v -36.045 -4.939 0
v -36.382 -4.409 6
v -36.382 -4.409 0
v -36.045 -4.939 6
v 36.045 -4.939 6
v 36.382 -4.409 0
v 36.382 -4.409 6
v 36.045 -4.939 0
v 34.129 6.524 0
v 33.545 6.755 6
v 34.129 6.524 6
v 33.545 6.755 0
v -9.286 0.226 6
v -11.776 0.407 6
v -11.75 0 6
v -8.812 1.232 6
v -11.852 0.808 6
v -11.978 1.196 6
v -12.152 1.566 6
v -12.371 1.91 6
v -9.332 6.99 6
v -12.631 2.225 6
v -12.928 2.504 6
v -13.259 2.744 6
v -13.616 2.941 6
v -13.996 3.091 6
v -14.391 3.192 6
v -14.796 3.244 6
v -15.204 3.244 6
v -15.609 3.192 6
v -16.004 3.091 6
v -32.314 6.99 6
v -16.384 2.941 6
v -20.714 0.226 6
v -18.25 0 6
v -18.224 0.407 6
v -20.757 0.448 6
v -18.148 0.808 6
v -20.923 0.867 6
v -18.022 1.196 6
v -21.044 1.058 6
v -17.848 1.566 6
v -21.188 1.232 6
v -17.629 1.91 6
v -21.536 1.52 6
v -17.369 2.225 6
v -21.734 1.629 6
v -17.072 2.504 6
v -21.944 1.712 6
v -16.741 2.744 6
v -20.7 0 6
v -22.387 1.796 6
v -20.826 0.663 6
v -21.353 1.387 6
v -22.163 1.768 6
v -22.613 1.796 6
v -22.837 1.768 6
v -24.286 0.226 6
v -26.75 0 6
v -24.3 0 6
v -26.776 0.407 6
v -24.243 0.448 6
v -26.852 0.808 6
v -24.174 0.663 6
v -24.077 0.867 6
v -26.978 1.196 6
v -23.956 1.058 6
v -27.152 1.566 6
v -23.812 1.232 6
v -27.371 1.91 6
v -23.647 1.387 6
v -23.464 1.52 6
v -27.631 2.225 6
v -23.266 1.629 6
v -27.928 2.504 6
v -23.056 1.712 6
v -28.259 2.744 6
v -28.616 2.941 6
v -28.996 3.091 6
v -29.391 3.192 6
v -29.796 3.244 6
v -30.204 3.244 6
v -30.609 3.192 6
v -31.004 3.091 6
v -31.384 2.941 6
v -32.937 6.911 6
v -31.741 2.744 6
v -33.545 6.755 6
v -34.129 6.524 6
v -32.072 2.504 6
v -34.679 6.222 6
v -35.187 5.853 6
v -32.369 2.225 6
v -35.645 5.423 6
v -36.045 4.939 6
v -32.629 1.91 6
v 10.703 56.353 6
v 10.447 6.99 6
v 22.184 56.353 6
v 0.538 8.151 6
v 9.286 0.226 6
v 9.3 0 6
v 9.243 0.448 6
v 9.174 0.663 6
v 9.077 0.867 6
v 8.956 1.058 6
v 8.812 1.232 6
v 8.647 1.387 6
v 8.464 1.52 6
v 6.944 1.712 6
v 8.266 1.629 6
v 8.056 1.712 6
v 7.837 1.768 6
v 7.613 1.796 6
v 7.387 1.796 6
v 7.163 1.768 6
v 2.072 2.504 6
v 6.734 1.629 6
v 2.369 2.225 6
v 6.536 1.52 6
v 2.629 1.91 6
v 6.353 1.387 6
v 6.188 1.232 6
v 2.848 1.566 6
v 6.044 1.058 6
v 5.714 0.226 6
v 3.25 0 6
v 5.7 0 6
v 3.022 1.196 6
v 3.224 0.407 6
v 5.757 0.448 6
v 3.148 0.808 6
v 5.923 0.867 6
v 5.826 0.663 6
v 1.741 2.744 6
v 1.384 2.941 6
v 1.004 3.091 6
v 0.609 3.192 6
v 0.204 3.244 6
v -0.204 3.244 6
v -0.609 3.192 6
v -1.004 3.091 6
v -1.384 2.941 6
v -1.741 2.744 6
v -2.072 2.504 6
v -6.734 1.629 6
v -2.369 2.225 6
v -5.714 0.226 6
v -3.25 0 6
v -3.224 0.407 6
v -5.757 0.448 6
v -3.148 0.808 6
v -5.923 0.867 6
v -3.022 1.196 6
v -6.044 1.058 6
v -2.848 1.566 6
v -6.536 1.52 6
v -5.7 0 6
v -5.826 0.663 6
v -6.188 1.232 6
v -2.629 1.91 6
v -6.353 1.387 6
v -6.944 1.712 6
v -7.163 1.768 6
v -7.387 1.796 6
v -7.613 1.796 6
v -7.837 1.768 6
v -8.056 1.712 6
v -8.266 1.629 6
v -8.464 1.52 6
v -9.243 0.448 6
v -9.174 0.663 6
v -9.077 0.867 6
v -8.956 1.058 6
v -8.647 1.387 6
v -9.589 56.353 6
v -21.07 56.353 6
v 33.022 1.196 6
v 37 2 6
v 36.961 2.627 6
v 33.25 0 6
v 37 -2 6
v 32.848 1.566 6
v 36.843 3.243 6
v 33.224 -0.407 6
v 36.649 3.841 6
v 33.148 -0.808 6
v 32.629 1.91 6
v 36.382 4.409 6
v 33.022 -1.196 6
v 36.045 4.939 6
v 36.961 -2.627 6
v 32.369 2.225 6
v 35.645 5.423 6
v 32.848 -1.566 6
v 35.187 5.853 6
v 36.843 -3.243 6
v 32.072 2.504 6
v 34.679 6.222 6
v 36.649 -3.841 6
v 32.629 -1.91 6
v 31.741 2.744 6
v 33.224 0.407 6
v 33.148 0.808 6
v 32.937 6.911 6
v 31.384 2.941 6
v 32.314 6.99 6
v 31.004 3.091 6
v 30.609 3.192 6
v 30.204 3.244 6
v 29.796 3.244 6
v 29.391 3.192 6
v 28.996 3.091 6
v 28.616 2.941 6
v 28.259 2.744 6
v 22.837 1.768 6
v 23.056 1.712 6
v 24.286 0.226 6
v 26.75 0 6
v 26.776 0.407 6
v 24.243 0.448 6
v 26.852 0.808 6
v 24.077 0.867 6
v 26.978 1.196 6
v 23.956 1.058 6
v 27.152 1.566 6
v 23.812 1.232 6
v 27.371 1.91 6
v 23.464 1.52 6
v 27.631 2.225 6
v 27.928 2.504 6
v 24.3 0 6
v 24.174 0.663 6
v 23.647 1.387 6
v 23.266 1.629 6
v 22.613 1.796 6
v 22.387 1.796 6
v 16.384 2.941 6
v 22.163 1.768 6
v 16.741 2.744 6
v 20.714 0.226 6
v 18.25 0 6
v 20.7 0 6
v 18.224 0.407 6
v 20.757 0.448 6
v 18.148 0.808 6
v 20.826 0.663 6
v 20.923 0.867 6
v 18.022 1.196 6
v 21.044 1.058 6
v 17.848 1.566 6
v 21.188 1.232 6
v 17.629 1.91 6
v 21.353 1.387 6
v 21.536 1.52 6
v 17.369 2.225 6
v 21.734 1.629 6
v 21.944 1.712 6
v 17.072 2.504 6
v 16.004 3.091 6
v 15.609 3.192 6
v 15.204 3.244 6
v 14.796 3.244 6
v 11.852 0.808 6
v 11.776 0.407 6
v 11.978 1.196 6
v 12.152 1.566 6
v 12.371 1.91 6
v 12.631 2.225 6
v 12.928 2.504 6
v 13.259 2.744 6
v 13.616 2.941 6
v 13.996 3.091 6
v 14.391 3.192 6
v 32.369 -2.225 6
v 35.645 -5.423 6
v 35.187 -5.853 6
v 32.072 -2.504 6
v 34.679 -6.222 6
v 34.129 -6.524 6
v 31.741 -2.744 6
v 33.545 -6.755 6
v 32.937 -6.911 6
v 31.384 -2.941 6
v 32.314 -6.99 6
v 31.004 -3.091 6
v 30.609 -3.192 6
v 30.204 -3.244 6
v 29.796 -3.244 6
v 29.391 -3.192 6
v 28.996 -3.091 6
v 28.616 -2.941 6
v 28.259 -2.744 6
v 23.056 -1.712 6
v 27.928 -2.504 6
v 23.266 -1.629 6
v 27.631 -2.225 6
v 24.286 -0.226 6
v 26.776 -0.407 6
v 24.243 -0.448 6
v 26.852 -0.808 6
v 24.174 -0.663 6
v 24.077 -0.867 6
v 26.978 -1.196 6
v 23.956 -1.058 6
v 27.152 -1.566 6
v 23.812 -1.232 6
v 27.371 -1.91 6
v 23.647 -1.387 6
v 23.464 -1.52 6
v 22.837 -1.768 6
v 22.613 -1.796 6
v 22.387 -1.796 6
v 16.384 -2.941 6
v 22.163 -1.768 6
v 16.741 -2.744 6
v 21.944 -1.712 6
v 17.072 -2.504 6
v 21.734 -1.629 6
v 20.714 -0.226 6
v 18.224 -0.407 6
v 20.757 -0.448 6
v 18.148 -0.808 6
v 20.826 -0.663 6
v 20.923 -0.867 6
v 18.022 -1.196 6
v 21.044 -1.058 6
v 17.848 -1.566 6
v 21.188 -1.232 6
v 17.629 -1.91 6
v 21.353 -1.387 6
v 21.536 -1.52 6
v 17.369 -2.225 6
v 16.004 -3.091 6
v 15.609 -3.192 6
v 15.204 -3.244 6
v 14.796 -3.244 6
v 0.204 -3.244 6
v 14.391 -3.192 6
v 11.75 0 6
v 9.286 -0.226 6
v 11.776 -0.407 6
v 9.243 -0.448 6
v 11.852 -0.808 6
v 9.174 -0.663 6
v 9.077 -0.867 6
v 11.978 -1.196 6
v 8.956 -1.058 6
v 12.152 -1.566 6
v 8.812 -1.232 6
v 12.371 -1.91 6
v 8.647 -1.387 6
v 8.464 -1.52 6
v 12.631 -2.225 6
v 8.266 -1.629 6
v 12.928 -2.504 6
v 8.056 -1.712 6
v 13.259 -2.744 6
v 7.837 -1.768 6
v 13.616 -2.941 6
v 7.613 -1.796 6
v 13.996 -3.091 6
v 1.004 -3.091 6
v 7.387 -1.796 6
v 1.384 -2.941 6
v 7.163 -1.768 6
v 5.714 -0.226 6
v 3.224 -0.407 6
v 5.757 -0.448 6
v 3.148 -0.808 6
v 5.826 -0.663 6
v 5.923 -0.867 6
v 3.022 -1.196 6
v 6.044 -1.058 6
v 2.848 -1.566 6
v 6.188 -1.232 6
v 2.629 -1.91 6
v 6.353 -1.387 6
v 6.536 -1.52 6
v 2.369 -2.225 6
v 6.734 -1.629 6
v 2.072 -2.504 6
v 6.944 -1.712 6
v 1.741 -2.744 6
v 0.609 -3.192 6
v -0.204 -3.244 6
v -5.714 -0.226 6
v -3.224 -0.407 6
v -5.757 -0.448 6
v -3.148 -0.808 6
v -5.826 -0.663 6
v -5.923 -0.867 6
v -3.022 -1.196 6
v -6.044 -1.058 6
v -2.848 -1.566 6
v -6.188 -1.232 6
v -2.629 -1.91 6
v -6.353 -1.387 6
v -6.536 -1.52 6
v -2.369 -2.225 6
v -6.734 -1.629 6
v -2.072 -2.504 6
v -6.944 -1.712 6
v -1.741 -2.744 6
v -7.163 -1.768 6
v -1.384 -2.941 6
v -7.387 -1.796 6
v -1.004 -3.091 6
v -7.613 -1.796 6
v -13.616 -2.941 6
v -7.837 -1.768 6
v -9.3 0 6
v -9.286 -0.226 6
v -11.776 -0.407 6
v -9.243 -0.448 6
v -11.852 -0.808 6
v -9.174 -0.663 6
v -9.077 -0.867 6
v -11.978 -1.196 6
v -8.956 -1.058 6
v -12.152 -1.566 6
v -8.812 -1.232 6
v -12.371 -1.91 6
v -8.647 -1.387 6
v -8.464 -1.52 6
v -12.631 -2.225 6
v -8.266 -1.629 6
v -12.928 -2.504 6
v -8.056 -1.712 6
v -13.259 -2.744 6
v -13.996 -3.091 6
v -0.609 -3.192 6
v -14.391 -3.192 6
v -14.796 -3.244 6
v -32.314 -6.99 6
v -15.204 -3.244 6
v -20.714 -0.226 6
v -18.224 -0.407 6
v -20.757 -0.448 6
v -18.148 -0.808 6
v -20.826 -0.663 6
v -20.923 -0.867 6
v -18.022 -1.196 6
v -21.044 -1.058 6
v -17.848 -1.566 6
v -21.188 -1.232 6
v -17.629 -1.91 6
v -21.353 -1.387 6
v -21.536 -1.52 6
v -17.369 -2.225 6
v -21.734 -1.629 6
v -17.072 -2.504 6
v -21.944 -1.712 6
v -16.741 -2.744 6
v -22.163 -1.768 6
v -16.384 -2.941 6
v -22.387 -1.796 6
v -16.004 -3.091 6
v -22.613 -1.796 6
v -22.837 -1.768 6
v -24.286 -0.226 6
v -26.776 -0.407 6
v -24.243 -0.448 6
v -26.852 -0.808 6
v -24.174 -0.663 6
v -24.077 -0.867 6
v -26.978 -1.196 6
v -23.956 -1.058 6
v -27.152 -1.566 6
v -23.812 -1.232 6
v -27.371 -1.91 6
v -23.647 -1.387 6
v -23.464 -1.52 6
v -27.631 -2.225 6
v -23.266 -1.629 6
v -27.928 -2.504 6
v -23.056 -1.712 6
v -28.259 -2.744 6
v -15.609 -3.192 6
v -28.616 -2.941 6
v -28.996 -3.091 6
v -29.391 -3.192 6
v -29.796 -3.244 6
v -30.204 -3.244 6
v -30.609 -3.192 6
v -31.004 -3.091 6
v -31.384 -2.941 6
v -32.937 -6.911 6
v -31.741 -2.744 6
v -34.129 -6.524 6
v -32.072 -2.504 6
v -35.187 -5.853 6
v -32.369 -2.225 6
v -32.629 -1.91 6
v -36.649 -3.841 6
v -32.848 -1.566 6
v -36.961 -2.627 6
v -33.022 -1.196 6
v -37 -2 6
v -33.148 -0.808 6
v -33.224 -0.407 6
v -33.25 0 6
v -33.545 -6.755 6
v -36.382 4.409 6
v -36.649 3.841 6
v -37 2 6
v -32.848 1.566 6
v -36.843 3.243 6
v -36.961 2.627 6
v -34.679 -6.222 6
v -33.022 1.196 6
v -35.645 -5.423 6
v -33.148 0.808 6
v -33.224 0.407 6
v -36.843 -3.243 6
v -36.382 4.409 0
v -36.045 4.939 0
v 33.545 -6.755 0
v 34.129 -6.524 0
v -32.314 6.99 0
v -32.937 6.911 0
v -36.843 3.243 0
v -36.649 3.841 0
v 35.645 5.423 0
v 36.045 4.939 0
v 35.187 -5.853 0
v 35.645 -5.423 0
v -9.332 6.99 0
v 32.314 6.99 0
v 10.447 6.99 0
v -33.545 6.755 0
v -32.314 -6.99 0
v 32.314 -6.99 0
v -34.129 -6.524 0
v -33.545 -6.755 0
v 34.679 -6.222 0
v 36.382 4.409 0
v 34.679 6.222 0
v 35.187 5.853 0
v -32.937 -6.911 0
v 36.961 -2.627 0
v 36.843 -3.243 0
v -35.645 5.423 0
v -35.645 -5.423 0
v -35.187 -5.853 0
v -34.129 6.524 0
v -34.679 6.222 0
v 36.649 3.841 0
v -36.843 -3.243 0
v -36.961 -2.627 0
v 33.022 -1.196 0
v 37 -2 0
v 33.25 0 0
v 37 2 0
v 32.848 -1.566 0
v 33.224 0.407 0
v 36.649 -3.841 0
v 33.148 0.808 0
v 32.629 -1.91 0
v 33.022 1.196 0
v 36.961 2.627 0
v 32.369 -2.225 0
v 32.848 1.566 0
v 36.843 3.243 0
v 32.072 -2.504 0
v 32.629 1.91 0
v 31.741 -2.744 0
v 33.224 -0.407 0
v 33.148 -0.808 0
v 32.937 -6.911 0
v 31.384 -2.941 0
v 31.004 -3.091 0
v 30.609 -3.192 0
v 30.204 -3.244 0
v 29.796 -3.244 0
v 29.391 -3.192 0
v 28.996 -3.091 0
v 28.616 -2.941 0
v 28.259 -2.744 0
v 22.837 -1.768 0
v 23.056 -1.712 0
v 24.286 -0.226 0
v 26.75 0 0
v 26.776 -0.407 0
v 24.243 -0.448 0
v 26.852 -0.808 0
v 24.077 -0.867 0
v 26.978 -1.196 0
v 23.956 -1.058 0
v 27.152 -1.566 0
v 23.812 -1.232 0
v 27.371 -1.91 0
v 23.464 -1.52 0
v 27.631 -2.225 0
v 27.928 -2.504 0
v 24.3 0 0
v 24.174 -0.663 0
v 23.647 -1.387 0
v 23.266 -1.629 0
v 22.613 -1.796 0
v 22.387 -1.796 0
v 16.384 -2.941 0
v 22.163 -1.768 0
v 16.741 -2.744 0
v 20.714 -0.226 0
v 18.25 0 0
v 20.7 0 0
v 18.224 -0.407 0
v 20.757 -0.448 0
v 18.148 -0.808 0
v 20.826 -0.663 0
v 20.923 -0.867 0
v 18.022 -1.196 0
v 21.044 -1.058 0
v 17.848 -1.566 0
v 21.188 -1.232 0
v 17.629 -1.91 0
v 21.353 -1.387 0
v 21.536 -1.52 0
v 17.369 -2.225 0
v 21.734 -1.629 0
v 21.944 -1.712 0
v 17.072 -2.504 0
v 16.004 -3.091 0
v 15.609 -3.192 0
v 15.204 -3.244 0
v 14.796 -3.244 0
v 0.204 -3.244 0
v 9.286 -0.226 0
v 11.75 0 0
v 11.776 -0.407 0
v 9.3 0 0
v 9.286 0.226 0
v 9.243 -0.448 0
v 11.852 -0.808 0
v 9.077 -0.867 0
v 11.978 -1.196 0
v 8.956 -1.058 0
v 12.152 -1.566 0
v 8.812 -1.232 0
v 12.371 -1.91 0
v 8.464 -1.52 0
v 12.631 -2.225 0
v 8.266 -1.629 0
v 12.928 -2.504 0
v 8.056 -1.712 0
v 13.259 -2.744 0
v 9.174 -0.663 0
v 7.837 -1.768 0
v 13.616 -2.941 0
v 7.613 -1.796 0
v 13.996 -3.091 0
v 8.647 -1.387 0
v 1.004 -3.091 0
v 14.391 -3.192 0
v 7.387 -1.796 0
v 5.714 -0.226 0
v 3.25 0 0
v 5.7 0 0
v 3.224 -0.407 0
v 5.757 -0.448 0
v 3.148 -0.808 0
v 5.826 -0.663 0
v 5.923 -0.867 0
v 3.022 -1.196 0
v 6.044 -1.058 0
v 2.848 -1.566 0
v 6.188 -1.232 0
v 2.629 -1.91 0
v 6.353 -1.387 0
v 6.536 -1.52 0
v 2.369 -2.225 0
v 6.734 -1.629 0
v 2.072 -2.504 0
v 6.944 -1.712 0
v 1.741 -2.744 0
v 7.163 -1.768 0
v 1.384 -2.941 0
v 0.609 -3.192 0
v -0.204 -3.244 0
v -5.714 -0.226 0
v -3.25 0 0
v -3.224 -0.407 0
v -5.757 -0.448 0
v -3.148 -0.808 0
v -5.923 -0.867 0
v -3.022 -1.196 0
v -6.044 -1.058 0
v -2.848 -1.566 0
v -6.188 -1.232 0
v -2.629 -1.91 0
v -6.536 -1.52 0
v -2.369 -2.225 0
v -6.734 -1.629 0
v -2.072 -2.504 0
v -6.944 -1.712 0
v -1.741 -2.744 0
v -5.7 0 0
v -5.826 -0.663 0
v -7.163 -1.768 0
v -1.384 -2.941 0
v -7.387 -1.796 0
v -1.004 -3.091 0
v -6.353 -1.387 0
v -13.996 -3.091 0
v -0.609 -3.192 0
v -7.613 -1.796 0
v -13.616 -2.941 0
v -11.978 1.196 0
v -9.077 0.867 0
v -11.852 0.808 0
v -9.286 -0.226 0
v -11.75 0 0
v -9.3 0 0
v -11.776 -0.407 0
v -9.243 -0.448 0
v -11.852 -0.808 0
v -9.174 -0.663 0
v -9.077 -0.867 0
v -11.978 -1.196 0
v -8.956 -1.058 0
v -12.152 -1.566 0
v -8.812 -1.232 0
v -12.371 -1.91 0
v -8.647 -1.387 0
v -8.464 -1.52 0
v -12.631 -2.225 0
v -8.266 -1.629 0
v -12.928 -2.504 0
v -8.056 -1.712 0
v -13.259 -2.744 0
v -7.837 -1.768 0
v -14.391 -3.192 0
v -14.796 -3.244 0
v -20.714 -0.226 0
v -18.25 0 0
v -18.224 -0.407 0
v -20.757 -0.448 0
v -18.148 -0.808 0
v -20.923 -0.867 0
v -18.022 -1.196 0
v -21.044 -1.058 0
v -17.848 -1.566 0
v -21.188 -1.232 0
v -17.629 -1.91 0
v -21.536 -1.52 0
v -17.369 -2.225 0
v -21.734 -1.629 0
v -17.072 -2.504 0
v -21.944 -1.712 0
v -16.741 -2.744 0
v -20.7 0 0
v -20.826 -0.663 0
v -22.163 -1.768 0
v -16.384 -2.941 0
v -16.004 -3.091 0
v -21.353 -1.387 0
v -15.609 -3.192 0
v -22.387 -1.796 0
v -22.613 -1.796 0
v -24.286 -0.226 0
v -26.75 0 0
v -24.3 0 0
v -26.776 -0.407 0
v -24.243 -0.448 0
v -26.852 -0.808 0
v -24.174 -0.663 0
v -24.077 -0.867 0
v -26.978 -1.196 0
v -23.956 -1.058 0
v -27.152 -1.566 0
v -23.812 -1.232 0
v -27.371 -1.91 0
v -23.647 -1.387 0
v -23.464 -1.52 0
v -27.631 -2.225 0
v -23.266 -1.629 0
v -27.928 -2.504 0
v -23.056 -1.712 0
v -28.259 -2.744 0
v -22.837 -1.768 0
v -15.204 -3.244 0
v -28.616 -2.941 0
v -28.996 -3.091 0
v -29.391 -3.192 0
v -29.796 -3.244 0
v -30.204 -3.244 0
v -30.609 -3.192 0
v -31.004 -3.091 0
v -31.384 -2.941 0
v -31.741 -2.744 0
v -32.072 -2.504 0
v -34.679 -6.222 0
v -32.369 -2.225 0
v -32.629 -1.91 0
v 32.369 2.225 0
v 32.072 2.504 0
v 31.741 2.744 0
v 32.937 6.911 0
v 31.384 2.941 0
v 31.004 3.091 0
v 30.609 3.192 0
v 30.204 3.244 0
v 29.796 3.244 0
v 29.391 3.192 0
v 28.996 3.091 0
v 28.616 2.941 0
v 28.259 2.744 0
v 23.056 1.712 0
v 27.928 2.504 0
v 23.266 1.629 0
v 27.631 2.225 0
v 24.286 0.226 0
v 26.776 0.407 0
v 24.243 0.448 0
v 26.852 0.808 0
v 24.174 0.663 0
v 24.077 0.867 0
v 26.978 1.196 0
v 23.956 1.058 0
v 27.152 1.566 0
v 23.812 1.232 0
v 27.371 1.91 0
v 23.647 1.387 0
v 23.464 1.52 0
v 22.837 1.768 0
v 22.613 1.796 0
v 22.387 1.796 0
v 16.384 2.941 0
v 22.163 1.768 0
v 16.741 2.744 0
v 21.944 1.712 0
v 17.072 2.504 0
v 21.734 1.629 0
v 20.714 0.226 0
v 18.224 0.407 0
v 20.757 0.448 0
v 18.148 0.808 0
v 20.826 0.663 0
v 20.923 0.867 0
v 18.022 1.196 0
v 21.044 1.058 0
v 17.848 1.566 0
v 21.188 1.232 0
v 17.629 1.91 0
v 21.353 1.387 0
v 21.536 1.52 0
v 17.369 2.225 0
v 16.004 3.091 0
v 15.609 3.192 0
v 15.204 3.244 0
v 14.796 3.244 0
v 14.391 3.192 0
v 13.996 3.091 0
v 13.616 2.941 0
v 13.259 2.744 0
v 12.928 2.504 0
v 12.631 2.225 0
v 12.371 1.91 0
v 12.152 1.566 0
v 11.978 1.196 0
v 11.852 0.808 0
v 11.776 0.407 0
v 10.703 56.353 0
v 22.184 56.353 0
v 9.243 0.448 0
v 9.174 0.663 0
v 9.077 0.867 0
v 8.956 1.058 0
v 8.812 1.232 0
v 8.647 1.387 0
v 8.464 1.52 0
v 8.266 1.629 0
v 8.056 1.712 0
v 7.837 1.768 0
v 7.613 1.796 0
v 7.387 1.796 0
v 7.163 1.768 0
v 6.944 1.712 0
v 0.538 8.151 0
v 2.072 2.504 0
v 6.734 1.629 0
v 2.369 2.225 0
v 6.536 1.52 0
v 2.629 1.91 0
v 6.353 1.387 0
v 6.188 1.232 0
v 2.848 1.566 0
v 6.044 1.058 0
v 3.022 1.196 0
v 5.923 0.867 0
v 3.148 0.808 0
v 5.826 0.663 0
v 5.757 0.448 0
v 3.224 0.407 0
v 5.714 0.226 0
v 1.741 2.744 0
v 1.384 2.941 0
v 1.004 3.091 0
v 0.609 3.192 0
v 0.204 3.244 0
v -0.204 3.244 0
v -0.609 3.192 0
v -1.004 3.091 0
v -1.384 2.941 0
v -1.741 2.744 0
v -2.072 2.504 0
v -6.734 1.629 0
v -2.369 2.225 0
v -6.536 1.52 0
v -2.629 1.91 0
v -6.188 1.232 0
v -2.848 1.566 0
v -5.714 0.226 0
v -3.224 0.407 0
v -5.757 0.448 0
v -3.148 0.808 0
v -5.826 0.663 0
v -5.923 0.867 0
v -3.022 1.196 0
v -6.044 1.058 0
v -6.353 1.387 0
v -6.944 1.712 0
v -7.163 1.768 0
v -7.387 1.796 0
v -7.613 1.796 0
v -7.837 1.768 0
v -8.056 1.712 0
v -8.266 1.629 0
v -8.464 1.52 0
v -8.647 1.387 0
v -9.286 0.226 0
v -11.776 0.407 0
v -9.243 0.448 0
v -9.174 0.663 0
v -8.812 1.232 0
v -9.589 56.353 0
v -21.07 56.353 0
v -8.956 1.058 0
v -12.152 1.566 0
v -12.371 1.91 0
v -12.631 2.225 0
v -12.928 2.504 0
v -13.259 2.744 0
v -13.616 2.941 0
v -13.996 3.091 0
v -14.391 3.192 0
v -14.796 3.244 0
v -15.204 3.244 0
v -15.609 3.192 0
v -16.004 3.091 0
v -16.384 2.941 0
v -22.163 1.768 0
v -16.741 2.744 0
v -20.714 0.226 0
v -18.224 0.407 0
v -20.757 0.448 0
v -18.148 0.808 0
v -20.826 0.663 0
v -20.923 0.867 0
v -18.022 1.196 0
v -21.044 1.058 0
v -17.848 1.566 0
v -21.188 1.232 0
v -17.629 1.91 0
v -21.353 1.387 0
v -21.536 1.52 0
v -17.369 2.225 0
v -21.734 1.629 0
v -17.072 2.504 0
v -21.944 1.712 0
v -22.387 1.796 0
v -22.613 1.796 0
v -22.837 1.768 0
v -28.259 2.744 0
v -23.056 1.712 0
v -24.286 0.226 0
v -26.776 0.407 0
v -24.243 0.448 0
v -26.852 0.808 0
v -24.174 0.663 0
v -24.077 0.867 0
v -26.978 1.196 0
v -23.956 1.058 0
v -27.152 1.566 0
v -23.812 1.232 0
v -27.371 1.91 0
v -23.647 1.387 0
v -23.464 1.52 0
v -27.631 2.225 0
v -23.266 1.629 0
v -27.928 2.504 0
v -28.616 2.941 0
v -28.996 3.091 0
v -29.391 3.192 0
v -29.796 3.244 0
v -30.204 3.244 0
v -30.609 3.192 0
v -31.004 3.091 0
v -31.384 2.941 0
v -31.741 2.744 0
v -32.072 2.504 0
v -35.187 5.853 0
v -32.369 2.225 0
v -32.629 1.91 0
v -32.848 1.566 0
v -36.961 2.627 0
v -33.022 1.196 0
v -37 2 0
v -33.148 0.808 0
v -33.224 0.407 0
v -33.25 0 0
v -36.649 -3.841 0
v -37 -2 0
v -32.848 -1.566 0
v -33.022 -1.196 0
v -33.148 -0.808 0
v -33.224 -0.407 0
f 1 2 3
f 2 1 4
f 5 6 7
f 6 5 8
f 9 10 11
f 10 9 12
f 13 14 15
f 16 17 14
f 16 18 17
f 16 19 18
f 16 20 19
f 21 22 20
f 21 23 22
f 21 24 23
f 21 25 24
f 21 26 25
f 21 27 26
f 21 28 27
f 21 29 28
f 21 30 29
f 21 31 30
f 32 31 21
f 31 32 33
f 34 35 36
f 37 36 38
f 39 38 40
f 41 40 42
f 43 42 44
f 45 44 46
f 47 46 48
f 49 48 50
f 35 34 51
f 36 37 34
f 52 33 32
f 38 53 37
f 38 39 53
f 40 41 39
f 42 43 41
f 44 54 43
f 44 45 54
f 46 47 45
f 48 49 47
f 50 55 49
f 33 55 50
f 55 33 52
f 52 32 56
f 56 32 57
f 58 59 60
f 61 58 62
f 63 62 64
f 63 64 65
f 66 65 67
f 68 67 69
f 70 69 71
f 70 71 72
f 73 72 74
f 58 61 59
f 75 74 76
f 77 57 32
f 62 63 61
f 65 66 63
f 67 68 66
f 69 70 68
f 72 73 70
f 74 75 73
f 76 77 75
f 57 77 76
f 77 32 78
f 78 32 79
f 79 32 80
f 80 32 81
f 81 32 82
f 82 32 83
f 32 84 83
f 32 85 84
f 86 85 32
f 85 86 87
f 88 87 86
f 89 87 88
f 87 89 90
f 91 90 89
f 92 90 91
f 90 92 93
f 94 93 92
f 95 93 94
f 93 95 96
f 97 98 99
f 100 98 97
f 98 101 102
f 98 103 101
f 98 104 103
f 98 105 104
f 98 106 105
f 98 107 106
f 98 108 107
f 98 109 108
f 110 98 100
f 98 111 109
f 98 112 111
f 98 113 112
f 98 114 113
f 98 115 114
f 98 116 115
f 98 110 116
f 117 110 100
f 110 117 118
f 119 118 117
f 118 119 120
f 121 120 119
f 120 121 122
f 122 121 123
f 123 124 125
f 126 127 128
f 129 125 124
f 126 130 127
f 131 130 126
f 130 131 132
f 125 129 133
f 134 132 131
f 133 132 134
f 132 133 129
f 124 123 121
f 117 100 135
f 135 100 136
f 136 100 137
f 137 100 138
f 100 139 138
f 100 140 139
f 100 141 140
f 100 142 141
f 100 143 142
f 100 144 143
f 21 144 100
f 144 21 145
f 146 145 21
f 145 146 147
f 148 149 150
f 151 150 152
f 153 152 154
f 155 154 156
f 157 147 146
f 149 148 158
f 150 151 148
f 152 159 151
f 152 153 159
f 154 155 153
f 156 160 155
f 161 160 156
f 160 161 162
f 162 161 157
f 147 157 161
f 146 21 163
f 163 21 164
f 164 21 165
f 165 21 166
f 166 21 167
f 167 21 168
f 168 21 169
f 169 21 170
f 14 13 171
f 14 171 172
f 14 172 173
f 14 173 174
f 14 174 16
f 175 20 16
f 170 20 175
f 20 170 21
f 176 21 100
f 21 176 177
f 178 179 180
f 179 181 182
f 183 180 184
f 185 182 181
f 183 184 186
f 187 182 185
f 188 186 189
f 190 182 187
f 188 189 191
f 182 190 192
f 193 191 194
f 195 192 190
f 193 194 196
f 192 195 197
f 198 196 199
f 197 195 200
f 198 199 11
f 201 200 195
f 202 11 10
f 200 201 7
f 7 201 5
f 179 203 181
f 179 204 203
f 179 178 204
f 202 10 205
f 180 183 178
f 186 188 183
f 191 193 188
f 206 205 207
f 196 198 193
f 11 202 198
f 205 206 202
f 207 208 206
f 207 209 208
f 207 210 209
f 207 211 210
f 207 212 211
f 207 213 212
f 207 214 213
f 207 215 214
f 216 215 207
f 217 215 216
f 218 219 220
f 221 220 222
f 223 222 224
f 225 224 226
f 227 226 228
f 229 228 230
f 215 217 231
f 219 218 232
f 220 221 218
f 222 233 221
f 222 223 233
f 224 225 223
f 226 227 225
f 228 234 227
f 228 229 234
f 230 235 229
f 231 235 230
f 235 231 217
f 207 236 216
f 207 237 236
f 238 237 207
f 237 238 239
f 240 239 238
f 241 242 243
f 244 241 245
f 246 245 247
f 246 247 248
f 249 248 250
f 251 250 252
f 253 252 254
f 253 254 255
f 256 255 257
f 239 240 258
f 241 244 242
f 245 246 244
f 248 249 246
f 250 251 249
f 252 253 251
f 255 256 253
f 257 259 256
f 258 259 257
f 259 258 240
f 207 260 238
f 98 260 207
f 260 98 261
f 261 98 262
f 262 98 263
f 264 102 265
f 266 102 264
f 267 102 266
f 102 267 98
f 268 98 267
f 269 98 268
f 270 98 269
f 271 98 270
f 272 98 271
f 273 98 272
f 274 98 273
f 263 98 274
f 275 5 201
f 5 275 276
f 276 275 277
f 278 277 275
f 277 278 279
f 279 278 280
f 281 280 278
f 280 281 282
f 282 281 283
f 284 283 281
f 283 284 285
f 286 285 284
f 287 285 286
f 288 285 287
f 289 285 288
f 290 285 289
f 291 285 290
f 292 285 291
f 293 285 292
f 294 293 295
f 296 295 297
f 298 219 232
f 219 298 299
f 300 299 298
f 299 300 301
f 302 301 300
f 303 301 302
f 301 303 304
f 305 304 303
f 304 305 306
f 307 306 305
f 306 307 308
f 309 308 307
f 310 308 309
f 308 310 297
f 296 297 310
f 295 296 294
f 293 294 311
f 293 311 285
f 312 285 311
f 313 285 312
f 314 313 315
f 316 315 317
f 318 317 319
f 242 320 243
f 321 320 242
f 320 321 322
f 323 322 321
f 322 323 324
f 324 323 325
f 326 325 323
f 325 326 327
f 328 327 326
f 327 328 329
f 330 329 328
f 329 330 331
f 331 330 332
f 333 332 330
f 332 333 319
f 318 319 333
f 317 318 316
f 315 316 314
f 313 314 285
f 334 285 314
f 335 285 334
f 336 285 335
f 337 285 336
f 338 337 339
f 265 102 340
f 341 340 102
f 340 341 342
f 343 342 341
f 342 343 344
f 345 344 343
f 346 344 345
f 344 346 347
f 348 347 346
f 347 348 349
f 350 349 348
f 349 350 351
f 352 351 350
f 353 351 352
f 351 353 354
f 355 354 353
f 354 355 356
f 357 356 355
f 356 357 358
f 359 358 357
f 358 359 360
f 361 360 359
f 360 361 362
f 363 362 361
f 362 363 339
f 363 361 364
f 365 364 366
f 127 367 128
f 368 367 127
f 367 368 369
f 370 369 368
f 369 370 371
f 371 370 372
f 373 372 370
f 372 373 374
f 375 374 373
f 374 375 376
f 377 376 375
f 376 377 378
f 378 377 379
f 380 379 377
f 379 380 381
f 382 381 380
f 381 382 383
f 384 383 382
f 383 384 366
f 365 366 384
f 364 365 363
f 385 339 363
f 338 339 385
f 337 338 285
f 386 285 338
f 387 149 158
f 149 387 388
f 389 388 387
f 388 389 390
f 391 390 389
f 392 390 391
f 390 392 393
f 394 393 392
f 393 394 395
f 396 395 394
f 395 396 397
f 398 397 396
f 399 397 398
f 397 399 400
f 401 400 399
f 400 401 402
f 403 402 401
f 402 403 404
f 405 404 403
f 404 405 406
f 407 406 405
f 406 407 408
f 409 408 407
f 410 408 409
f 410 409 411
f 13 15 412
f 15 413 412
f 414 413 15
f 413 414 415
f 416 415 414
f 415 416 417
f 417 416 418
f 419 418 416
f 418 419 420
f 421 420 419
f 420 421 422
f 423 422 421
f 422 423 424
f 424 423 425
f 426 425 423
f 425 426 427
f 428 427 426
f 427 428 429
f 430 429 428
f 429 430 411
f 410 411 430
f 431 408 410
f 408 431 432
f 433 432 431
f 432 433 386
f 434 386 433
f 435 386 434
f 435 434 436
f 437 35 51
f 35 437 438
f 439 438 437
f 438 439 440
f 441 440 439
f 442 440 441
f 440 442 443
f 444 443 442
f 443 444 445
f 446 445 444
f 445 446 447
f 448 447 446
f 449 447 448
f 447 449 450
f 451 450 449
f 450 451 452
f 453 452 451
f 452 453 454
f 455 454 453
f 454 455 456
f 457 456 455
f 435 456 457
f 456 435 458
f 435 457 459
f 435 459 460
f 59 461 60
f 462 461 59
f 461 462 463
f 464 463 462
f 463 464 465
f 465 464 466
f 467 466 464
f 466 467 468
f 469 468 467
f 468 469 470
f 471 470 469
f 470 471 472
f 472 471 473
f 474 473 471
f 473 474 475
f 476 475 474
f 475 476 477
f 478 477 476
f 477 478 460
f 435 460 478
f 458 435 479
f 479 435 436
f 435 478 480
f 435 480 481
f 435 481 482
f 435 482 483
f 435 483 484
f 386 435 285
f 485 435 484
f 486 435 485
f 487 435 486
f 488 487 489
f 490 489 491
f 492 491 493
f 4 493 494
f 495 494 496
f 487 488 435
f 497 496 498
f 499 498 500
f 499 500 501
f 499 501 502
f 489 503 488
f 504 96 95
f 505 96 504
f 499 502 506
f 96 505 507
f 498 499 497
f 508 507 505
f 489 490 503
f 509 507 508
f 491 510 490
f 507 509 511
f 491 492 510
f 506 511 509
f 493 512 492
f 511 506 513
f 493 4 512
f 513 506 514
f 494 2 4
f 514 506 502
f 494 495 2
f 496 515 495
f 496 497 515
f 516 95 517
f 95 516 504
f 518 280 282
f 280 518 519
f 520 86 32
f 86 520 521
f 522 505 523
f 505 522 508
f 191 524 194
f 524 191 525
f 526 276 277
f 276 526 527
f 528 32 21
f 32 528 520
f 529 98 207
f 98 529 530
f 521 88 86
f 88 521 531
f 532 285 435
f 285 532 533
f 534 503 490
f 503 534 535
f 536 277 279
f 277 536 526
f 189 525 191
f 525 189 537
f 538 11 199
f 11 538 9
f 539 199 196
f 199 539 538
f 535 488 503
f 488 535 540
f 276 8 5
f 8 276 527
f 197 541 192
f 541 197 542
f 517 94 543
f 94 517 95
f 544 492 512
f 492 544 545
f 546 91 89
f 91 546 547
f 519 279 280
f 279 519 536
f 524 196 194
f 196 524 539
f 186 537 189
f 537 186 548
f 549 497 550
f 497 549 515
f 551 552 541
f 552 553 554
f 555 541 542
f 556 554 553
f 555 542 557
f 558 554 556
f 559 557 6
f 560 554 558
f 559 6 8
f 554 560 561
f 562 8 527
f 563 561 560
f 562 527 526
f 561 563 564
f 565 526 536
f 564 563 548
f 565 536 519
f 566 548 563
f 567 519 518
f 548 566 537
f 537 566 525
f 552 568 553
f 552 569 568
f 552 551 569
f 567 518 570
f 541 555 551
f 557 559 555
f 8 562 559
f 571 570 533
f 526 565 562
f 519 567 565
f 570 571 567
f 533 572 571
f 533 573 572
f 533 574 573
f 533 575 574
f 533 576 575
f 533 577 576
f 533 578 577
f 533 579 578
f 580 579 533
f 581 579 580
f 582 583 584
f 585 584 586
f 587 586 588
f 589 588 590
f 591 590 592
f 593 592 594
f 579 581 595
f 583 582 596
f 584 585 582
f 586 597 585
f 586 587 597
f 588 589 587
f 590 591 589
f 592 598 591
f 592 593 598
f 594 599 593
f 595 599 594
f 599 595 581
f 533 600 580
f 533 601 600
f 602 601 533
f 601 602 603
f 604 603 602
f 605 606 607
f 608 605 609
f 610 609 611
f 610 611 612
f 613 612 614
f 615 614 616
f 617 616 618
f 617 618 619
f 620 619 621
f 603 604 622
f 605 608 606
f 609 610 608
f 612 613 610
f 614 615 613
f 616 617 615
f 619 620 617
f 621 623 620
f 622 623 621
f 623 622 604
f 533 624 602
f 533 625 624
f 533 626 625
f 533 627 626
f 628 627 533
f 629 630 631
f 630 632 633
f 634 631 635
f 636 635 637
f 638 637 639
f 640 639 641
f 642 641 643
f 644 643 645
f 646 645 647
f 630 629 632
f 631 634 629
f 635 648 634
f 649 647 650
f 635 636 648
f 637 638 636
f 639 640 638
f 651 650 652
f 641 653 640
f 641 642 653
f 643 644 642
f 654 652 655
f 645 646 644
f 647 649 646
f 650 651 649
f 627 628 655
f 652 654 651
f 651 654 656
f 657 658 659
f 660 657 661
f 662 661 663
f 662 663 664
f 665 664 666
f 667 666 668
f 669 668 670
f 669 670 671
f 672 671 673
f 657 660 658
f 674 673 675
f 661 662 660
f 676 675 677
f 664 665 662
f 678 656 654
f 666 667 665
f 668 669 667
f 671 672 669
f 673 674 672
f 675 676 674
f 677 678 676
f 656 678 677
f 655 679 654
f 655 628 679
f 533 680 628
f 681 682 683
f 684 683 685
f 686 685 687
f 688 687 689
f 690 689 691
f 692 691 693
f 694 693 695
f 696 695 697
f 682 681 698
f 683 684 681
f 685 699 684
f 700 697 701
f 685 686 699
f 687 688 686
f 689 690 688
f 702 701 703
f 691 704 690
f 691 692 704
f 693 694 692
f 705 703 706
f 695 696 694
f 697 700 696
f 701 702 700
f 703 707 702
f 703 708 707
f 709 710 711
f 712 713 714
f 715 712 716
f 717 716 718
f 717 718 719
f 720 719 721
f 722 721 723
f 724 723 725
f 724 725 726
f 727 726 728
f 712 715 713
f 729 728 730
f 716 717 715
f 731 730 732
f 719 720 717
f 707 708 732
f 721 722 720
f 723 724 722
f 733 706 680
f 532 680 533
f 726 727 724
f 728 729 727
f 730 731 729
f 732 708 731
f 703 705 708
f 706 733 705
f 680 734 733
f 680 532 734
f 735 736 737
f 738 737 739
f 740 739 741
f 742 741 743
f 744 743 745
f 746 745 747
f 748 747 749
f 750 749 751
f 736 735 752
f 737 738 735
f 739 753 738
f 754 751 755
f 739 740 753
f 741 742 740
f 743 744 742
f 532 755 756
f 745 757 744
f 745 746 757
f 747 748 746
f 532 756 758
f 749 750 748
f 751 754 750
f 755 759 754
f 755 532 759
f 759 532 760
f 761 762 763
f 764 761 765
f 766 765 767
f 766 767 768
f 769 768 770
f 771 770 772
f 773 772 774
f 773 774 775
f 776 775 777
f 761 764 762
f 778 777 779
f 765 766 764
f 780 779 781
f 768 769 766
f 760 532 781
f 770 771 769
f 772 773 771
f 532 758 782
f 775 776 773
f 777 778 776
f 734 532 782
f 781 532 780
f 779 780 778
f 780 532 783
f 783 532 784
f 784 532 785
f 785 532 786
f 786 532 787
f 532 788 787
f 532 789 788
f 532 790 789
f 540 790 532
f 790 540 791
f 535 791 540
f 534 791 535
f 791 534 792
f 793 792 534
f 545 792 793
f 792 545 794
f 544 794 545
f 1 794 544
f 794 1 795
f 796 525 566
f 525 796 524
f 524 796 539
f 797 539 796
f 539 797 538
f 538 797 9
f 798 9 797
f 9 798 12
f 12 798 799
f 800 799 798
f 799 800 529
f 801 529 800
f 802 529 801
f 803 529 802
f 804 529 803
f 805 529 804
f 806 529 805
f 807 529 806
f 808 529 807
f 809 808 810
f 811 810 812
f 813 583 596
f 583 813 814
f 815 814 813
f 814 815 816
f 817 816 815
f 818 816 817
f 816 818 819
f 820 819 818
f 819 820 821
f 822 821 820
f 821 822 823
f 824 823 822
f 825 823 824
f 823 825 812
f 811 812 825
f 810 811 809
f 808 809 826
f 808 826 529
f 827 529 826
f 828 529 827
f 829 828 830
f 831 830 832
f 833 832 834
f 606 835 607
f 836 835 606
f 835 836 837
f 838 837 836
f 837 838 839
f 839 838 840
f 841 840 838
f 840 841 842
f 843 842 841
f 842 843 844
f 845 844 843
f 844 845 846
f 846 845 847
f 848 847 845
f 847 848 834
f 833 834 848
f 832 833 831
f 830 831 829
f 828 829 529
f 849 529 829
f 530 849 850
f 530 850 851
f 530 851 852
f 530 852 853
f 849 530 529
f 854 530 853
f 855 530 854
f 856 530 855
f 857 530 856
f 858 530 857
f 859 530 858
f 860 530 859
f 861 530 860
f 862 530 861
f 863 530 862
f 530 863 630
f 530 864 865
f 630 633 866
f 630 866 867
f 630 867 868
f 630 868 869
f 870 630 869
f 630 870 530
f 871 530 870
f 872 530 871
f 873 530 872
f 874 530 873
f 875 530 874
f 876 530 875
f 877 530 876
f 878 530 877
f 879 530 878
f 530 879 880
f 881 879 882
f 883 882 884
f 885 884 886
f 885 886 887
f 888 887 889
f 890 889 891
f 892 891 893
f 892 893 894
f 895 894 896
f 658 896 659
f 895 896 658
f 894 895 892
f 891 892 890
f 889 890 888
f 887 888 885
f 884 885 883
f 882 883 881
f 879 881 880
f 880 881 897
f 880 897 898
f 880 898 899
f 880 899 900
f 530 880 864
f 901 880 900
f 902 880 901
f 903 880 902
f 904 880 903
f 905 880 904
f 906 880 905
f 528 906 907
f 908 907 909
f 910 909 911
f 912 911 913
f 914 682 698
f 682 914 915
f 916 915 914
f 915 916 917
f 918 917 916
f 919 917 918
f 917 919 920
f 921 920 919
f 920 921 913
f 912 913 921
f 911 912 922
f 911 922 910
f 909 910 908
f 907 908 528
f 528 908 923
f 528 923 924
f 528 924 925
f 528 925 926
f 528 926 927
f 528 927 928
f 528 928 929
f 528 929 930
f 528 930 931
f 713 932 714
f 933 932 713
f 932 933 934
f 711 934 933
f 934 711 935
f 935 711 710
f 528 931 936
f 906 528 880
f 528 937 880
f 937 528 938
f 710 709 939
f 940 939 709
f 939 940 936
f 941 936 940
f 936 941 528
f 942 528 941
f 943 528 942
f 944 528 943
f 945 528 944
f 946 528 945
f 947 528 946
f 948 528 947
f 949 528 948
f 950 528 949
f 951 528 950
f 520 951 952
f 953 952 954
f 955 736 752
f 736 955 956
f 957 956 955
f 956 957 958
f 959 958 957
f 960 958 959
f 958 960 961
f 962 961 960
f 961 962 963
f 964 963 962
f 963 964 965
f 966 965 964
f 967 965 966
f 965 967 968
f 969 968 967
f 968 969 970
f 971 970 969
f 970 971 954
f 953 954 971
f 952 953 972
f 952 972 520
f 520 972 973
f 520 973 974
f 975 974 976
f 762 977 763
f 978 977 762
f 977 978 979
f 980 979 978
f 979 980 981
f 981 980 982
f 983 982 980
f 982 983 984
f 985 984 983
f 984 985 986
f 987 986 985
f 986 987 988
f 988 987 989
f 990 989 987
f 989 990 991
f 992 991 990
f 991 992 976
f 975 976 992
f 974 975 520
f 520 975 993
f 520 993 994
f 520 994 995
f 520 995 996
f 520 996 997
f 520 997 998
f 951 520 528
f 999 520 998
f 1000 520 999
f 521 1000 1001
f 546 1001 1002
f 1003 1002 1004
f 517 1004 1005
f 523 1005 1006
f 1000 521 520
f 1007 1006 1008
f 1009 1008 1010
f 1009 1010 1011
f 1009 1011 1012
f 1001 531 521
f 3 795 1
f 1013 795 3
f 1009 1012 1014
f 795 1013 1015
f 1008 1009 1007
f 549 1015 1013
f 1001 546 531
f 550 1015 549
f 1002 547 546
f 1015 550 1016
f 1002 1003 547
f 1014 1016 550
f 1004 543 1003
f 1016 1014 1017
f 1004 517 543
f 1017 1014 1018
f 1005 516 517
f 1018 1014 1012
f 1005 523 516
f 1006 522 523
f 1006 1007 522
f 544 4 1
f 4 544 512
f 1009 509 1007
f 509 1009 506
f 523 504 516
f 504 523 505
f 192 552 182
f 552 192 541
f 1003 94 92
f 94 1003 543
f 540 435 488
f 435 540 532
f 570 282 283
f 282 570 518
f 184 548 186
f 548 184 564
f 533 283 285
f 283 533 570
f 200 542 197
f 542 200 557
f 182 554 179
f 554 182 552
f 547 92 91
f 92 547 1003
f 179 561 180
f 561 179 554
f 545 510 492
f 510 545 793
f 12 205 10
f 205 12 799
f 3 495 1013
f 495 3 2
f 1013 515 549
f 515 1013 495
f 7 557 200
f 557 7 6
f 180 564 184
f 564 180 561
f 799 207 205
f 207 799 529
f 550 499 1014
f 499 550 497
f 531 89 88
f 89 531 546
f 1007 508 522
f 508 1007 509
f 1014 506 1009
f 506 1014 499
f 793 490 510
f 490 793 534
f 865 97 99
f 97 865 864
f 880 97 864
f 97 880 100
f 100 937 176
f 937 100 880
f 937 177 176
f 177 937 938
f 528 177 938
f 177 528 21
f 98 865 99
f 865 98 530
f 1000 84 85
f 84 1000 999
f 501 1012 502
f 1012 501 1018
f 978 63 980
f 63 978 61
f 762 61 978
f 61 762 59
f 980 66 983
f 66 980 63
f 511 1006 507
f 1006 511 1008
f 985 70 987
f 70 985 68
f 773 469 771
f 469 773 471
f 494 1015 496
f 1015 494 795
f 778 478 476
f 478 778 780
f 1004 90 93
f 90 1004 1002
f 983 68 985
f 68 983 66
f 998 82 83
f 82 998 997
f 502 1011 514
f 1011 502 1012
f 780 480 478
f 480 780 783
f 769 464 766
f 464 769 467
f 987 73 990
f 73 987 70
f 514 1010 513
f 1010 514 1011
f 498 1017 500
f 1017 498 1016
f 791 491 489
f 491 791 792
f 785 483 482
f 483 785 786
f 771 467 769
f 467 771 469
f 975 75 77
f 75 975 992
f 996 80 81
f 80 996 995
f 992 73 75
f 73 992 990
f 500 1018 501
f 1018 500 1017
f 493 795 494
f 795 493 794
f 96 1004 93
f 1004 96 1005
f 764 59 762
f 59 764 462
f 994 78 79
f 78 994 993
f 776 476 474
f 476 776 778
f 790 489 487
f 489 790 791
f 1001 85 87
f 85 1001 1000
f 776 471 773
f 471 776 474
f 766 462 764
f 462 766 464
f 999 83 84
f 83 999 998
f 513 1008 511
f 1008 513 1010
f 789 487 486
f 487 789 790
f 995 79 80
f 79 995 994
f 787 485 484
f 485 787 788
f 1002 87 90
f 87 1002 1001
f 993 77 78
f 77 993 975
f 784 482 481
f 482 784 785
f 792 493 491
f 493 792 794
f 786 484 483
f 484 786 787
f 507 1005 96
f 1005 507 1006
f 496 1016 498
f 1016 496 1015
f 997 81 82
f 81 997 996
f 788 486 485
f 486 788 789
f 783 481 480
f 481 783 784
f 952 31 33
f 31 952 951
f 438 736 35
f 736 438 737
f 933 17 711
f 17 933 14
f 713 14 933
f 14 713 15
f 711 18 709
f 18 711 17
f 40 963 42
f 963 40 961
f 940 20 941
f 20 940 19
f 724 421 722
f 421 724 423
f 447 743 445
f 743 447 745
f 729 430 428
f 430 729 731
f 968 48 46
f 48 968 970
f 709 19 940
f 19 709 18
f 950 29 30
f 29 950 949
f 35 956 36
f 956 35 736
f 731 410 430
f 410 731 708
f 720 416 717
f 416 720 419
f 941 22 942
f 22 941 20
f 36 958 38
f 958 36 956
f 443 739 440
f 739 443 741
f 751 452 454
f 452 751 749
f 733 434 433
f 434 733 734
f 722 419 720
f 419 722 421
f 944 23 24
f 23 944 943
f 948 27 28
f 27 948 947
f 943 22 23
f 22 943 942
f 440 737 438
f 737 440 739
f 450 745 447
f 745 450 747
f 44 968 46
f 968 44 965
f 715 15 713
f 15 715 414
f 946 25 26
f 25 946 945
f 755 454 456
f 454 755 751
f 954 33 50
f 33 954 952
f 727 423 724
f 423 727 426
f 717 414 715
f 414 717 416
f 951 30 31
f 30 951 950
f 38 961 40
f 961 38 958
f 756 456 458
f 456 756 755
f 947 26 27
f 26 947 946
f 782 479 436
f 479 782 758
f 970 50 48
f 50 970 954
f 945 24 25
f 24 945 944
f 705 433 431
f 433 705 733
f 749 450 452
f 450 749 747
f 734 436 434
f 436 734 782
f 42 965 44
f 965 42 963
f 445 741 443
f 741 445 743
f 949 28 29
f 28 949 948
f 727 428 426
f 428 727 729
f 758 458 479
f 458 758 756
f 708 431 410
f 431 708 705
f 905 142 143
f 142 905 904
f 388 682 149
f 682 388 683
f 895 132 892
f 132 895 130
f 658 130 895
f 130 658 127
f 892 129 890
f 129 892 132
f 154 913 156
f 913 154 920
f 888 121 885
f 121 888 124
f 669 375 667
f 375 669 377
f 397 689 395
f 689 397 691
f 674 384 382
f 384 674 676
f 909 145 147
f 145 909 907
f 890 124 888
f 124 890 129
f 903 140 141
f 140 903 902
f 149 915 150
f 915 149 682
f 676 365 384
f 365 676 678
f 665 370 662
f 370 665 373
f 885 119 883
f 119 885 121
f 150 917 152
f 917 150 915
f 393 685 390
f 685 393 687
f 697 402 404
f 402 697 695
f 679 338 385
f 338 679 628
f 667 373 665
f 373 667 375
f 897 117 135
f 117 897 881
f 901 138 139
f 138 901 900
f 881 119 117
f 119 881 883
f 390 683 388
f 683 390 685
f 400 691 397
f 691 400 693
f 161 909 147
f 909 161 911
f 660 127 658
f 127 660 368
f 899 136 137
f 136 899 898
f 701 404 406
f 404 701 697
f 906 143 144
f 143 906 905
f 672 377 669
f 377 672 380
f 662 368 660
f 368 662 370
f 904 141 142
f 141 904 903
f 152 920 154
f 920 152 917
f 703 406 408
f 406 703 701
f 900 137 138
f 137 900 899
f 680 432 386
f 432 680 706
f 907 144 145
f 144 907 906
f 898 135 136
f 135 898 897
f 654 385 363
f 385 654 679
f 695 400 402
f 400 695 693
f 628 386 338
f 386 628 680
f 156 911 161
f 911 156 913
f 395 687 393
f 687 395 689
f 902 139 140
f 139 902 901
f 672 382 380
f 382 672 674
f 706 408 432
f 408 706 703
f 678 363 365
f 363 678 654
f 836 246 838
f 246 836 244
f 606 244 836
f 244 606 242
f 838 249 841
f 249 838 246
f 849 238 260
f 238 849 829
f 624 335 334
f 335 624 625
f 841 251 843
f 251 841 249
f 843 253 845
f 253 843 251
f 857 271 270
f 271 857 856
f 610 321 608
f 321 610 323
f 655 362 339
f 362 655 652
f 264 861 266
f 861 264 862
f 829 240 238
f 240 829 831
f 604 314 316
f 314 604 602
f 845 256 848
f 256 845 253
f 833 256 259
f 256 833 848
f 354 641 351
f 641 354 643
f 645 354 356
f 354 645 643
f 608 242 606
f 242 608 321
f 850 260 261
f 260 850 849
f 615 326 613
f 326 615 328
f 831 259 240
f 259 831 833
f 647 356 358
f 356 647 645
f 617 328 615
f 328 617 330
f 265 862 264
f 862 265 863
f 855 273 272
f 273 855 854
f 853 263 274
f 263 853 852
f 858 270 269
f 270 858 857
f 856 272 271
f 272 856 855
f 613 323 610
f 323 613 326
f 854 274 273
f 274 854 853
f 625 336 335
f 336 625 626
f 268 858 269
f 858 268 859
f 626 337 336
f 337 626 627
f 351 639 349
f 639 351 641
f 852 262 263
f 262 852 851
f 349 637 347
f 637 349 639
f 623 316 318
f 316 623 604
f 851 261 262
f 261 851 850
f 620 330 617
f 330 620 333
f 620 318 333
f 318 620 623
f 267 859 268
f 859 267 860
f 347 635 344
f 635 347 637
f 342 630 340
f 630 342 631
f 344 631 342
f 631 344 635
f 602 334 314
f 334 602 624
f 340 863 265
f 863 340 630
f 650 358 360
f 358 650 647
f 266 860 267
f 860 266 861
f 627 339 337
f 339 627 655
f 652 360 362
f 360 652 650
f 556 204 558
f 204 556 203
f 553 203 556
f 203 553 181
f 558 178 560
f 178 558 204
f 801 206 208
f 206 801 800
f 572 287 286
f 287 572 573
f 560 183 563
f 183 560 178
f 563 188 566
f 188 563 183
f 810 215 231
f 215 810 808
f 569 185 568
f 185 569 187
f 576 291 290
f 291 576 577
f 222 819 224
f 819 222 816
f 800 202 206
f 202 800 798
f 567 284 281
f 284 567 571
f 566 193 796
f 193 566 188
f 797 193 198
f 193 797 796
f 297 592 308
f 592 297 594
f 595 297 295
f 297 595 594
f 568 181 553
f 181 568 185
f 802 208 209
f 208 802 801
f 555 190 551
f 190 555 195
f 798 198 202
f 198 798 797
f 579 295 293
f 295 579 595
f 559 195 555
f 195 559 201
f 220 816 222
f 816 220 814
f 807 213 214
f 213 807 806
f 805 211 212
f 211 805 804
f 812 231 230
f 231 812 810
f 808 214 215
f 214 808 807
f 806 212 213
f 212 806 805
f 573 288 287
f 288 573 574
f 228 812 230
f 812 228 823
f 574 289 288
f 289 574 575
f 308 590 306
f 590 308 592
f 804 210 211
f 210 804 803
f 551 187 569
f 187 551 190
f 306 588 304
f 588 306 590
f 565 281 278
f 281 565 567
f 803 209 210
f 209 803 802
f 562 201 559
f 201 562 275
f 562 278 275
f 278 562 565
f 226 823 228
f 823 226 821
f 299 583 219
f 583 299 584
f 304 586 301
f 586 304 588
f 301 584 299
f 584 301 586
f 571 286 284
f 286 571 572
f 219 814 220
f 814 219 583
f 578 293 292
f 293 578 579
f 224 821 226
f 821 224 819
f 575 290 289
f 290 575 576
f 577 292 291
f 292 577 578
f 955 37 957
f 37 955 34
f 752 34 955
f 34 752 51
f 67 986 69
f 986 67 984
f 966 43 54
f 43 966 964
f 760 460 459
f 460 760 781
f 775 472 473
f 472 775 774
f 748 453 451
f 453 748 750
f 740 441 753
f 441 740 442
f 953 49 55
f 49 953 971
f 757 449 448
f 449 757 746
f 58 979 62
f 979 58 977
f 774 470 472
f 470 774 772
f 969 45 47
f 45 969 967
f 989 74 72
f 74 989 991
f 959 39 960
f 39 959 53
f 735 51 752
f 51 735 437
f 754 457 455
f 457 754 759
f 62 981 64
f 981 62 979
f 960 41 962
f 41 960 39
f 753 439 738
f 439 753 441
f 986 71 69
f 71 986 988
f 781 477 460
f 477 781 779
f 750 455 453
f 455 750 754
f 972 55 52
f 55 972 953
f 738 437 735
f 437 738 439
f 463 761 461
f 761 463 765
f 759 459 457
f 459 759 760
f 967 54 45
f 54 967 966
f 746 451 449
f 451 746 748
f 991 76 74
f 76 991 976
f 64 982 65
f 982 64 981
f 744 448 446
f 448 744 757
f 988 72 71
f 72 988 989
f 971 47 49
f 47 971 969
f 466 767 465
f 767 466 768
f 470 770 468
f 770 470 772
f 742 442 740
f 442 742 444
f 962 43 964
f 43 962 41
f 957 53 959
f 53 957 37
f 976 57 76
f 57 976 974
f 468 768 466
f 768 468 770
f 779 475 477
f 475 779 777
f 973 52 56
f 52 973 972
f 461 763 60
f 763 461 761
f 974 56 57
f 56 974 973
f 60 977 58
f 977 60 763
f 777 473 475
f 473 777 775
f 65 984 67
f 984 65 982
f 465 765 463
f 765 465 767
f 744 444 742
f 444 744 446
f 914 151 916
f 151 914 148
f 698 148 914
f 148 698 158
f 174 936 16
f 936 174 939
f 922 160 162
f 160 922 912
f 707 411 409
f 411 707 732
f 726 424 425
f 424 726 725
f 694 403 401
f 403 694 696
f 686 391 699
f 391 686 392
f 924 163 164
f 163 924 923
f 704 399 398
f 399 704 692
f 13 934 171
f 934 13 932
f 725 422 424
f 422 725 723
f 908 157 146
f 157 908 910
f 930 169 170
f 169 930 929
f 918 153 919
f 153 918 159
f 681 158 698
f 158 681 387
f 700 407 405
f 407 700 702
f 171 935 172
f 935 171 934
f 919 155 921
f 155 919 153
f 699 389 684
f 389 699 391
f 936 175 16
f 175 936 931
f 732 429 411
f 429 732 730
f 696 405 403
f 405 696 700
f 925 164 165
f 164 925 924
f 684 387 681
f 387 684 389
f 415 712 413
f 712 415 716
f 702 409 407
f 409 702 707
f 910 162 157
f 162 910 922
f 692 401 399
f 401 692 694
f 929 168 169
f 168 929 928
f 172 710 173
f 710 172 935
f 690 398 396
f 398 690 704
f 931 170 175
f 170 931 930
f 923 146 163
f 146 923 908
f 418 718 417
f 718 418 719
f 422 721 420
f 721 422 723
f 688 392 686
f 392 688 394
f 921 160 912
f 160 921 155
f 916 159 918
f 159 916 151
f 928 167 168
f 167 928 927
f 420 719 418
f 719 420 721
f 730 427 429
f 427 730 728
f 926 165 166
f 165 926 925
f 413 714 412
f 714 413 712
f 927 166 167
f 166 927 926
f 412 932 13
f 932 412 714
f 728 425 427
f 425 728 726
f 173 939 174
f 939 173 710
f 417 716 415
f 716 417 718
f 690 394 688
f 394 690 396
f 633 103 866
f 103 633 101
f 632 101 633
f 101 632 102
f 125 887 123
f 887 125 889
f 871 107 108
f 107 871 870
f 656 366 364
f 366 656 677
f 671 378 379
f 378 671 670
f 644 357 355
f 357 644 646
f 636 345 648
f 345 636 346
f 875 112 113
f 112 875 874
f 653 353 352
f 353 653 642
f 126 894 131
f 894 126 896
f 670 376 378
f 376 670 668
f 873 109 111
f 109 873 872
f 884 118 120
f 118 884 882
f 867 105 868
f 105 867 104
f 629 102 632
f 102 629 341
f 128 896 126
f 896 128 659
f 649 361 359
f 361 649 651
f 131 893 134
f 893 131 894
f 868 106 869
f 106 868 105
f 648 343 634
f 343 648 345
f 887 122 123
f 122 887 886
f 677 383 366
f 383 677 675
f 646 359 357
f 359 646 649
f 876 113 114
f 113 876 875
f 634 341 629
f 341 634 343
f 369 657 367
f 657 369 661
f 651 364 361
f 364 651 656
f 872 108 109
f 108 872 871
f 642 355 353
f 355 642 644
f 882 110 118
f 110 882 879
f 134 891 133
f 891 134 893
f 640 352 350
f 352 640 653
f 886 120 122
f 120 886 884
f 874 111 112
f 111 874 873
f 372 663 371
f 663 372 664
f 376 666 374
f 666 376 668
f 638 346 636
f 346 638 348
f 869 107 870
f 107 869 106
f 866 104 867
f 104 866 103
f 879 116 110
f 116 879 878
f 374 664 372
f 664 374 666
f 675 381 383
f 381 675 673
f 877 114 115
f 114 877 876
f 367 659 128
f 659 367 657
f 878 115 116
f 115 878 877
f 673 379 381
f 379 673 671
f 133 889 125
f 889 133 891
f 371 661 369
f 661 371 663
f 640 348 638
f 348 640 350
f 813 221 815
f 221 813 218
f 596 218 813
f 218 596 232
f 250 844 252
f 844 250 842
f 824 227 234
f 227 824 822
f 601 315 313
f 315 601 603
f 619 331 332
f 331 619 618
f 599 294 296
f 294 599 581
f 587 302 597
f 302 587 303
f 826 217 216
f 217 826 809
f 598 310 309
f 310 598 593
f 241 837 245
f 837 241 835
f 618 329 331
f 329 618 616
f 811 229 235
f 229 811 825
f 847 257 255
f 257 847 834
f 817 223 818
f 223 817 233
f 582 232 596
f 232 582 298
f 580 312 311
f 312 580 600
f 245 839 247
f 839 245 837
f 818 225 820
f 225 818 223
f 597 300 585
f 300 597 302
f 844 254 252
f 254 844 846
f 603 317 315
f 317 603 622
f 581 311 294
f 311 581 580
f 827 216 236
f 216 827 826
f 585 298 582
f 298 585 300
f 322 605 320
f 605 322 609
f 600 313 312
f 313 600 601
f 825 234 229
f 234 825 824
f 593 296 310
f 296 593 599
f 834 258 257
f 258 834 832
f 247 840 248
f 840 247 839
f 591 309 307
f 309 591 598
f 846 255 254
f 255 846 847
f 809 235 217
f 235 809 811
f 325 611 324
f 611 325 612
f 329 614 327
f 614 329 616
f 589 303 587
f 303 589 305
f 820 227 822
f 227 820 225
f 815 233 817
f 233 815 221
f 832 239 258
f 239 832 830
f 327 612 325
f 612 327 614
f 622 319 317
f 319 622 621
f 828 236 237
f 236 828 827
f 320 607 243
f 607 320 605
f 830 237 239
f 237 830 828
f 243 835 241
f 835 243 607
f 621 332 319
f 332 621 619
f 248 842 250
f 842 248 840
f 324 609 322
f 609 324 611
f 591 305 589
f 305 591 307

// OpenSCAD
$fn = 50;


difference() {
	union() {
		hull() {
			translate(v = [-32.0000000000, 2.0000000000, 0]) {
				cylinder(h = 6, r = 5);
			}
			translate(v = [32.0000000000, 2.0000000000, 0]) {
				cylinder(h = 6, r = 5);
			}
			translate(v = [-32.0000000000, -2.0000000000, 0]) {
				cylinder(h = 6, r = 5);
			}
			translate(v = [32.0000000000, -2.0000000000, 0]) {
				cylinder(h = 6, r = 5);
			}
		}
		translate(v = [0, 55, 0]) {
			linear_extrude(height = 6) {
				text(font = "DejaVu Sans Mono:style=Bold", halign = "center", size = 57.0000000000, text = "V", valign = "top");
			}
		}
	}
	union() {
		translate(v = [-30.0000000000, 0.0000000000, 0]) {
			translate(v = [0, 0, -100]) {
				cylinder(h = 200, r = 3.2500000000);
			}
		}
		translate(v = [-15.0000000000, 0.0000000000, 0]) {
			translate(v = [0, 0, -100]) {
				cylinder(h = 200, r = 3.2500000000);
			}
		}
		translate(v = [0, 0, -100]) {
			cylinder(h = 200, r = 3.2500000000);
		}
		translate(v = [15.0000000000, 0.0000000000, 0]) {
			translate(v = [0, 0, -100]) {
				cylinder(h = 200, r = 3.2500000000);
			}
		}
		translate(v = [30.0000000000, 0.0000000000, 0]) {
			translate(v = [0, 0, -100]) {
				cylinder(h = 200, r = 3.2500000000);
			}
		}
		translate(v = [-30.0000000000, 0.0000000000, 0]) {
			translate(v = [0, 0, -100]) {
				cylinder(h = 200, r = 1.8000000000);
			}
		}
		translate(v = [-22.5000000000, 0.0000000000, 0]) {
			translate(v = [0, 0, -100]) {
				cylinder(h = 200, r = 1.8000000000);
			}
		}
		translate(v = [-15.0000000000, 0.0000000000, 0]) {
			translate(v = [0, 0, -100]) {
				cylinder(h = 200, r = 1.8000000000);
			}
		}
		translate(v = [-7.5000000000, 0.0000000000, 0]) {
			translate(v = [0, 0, -100]) {
				cylinder(h = 200, r = 1.8000000000);
			}
		}
		translate(v = [0, 0, -100]) {
			cylinder(h = 200, r = 1.8000000000);
		}
		translate(v = [7.5000000000, 0.0000000000, 0]) {
			translate(v = [0, 0, -100]) {
				cylinder(h = 200, r = 1.8000000000);
			}
		}
		translate(v = [15.0000000000, 0.0000000000, 0]) {
			translate(v = [0, 0, -100]) {
				cylinder(h = 200, r = 1.8000000000);
			}
		}
		translate(v = [22.5000000000, 0.0000000000, 0]) {
			translate(v = [0, 0, -100]) {
				cylinder(h = 200, r = 1.8000000000);
			}
		}
		translate(v = [30.0000000000, 0.0000000000, 0]) {
			translate(v = [0, 0, -100]) {
				cylinder(h = 200, r = 1.8000000000);
			}
		}
	}
}
